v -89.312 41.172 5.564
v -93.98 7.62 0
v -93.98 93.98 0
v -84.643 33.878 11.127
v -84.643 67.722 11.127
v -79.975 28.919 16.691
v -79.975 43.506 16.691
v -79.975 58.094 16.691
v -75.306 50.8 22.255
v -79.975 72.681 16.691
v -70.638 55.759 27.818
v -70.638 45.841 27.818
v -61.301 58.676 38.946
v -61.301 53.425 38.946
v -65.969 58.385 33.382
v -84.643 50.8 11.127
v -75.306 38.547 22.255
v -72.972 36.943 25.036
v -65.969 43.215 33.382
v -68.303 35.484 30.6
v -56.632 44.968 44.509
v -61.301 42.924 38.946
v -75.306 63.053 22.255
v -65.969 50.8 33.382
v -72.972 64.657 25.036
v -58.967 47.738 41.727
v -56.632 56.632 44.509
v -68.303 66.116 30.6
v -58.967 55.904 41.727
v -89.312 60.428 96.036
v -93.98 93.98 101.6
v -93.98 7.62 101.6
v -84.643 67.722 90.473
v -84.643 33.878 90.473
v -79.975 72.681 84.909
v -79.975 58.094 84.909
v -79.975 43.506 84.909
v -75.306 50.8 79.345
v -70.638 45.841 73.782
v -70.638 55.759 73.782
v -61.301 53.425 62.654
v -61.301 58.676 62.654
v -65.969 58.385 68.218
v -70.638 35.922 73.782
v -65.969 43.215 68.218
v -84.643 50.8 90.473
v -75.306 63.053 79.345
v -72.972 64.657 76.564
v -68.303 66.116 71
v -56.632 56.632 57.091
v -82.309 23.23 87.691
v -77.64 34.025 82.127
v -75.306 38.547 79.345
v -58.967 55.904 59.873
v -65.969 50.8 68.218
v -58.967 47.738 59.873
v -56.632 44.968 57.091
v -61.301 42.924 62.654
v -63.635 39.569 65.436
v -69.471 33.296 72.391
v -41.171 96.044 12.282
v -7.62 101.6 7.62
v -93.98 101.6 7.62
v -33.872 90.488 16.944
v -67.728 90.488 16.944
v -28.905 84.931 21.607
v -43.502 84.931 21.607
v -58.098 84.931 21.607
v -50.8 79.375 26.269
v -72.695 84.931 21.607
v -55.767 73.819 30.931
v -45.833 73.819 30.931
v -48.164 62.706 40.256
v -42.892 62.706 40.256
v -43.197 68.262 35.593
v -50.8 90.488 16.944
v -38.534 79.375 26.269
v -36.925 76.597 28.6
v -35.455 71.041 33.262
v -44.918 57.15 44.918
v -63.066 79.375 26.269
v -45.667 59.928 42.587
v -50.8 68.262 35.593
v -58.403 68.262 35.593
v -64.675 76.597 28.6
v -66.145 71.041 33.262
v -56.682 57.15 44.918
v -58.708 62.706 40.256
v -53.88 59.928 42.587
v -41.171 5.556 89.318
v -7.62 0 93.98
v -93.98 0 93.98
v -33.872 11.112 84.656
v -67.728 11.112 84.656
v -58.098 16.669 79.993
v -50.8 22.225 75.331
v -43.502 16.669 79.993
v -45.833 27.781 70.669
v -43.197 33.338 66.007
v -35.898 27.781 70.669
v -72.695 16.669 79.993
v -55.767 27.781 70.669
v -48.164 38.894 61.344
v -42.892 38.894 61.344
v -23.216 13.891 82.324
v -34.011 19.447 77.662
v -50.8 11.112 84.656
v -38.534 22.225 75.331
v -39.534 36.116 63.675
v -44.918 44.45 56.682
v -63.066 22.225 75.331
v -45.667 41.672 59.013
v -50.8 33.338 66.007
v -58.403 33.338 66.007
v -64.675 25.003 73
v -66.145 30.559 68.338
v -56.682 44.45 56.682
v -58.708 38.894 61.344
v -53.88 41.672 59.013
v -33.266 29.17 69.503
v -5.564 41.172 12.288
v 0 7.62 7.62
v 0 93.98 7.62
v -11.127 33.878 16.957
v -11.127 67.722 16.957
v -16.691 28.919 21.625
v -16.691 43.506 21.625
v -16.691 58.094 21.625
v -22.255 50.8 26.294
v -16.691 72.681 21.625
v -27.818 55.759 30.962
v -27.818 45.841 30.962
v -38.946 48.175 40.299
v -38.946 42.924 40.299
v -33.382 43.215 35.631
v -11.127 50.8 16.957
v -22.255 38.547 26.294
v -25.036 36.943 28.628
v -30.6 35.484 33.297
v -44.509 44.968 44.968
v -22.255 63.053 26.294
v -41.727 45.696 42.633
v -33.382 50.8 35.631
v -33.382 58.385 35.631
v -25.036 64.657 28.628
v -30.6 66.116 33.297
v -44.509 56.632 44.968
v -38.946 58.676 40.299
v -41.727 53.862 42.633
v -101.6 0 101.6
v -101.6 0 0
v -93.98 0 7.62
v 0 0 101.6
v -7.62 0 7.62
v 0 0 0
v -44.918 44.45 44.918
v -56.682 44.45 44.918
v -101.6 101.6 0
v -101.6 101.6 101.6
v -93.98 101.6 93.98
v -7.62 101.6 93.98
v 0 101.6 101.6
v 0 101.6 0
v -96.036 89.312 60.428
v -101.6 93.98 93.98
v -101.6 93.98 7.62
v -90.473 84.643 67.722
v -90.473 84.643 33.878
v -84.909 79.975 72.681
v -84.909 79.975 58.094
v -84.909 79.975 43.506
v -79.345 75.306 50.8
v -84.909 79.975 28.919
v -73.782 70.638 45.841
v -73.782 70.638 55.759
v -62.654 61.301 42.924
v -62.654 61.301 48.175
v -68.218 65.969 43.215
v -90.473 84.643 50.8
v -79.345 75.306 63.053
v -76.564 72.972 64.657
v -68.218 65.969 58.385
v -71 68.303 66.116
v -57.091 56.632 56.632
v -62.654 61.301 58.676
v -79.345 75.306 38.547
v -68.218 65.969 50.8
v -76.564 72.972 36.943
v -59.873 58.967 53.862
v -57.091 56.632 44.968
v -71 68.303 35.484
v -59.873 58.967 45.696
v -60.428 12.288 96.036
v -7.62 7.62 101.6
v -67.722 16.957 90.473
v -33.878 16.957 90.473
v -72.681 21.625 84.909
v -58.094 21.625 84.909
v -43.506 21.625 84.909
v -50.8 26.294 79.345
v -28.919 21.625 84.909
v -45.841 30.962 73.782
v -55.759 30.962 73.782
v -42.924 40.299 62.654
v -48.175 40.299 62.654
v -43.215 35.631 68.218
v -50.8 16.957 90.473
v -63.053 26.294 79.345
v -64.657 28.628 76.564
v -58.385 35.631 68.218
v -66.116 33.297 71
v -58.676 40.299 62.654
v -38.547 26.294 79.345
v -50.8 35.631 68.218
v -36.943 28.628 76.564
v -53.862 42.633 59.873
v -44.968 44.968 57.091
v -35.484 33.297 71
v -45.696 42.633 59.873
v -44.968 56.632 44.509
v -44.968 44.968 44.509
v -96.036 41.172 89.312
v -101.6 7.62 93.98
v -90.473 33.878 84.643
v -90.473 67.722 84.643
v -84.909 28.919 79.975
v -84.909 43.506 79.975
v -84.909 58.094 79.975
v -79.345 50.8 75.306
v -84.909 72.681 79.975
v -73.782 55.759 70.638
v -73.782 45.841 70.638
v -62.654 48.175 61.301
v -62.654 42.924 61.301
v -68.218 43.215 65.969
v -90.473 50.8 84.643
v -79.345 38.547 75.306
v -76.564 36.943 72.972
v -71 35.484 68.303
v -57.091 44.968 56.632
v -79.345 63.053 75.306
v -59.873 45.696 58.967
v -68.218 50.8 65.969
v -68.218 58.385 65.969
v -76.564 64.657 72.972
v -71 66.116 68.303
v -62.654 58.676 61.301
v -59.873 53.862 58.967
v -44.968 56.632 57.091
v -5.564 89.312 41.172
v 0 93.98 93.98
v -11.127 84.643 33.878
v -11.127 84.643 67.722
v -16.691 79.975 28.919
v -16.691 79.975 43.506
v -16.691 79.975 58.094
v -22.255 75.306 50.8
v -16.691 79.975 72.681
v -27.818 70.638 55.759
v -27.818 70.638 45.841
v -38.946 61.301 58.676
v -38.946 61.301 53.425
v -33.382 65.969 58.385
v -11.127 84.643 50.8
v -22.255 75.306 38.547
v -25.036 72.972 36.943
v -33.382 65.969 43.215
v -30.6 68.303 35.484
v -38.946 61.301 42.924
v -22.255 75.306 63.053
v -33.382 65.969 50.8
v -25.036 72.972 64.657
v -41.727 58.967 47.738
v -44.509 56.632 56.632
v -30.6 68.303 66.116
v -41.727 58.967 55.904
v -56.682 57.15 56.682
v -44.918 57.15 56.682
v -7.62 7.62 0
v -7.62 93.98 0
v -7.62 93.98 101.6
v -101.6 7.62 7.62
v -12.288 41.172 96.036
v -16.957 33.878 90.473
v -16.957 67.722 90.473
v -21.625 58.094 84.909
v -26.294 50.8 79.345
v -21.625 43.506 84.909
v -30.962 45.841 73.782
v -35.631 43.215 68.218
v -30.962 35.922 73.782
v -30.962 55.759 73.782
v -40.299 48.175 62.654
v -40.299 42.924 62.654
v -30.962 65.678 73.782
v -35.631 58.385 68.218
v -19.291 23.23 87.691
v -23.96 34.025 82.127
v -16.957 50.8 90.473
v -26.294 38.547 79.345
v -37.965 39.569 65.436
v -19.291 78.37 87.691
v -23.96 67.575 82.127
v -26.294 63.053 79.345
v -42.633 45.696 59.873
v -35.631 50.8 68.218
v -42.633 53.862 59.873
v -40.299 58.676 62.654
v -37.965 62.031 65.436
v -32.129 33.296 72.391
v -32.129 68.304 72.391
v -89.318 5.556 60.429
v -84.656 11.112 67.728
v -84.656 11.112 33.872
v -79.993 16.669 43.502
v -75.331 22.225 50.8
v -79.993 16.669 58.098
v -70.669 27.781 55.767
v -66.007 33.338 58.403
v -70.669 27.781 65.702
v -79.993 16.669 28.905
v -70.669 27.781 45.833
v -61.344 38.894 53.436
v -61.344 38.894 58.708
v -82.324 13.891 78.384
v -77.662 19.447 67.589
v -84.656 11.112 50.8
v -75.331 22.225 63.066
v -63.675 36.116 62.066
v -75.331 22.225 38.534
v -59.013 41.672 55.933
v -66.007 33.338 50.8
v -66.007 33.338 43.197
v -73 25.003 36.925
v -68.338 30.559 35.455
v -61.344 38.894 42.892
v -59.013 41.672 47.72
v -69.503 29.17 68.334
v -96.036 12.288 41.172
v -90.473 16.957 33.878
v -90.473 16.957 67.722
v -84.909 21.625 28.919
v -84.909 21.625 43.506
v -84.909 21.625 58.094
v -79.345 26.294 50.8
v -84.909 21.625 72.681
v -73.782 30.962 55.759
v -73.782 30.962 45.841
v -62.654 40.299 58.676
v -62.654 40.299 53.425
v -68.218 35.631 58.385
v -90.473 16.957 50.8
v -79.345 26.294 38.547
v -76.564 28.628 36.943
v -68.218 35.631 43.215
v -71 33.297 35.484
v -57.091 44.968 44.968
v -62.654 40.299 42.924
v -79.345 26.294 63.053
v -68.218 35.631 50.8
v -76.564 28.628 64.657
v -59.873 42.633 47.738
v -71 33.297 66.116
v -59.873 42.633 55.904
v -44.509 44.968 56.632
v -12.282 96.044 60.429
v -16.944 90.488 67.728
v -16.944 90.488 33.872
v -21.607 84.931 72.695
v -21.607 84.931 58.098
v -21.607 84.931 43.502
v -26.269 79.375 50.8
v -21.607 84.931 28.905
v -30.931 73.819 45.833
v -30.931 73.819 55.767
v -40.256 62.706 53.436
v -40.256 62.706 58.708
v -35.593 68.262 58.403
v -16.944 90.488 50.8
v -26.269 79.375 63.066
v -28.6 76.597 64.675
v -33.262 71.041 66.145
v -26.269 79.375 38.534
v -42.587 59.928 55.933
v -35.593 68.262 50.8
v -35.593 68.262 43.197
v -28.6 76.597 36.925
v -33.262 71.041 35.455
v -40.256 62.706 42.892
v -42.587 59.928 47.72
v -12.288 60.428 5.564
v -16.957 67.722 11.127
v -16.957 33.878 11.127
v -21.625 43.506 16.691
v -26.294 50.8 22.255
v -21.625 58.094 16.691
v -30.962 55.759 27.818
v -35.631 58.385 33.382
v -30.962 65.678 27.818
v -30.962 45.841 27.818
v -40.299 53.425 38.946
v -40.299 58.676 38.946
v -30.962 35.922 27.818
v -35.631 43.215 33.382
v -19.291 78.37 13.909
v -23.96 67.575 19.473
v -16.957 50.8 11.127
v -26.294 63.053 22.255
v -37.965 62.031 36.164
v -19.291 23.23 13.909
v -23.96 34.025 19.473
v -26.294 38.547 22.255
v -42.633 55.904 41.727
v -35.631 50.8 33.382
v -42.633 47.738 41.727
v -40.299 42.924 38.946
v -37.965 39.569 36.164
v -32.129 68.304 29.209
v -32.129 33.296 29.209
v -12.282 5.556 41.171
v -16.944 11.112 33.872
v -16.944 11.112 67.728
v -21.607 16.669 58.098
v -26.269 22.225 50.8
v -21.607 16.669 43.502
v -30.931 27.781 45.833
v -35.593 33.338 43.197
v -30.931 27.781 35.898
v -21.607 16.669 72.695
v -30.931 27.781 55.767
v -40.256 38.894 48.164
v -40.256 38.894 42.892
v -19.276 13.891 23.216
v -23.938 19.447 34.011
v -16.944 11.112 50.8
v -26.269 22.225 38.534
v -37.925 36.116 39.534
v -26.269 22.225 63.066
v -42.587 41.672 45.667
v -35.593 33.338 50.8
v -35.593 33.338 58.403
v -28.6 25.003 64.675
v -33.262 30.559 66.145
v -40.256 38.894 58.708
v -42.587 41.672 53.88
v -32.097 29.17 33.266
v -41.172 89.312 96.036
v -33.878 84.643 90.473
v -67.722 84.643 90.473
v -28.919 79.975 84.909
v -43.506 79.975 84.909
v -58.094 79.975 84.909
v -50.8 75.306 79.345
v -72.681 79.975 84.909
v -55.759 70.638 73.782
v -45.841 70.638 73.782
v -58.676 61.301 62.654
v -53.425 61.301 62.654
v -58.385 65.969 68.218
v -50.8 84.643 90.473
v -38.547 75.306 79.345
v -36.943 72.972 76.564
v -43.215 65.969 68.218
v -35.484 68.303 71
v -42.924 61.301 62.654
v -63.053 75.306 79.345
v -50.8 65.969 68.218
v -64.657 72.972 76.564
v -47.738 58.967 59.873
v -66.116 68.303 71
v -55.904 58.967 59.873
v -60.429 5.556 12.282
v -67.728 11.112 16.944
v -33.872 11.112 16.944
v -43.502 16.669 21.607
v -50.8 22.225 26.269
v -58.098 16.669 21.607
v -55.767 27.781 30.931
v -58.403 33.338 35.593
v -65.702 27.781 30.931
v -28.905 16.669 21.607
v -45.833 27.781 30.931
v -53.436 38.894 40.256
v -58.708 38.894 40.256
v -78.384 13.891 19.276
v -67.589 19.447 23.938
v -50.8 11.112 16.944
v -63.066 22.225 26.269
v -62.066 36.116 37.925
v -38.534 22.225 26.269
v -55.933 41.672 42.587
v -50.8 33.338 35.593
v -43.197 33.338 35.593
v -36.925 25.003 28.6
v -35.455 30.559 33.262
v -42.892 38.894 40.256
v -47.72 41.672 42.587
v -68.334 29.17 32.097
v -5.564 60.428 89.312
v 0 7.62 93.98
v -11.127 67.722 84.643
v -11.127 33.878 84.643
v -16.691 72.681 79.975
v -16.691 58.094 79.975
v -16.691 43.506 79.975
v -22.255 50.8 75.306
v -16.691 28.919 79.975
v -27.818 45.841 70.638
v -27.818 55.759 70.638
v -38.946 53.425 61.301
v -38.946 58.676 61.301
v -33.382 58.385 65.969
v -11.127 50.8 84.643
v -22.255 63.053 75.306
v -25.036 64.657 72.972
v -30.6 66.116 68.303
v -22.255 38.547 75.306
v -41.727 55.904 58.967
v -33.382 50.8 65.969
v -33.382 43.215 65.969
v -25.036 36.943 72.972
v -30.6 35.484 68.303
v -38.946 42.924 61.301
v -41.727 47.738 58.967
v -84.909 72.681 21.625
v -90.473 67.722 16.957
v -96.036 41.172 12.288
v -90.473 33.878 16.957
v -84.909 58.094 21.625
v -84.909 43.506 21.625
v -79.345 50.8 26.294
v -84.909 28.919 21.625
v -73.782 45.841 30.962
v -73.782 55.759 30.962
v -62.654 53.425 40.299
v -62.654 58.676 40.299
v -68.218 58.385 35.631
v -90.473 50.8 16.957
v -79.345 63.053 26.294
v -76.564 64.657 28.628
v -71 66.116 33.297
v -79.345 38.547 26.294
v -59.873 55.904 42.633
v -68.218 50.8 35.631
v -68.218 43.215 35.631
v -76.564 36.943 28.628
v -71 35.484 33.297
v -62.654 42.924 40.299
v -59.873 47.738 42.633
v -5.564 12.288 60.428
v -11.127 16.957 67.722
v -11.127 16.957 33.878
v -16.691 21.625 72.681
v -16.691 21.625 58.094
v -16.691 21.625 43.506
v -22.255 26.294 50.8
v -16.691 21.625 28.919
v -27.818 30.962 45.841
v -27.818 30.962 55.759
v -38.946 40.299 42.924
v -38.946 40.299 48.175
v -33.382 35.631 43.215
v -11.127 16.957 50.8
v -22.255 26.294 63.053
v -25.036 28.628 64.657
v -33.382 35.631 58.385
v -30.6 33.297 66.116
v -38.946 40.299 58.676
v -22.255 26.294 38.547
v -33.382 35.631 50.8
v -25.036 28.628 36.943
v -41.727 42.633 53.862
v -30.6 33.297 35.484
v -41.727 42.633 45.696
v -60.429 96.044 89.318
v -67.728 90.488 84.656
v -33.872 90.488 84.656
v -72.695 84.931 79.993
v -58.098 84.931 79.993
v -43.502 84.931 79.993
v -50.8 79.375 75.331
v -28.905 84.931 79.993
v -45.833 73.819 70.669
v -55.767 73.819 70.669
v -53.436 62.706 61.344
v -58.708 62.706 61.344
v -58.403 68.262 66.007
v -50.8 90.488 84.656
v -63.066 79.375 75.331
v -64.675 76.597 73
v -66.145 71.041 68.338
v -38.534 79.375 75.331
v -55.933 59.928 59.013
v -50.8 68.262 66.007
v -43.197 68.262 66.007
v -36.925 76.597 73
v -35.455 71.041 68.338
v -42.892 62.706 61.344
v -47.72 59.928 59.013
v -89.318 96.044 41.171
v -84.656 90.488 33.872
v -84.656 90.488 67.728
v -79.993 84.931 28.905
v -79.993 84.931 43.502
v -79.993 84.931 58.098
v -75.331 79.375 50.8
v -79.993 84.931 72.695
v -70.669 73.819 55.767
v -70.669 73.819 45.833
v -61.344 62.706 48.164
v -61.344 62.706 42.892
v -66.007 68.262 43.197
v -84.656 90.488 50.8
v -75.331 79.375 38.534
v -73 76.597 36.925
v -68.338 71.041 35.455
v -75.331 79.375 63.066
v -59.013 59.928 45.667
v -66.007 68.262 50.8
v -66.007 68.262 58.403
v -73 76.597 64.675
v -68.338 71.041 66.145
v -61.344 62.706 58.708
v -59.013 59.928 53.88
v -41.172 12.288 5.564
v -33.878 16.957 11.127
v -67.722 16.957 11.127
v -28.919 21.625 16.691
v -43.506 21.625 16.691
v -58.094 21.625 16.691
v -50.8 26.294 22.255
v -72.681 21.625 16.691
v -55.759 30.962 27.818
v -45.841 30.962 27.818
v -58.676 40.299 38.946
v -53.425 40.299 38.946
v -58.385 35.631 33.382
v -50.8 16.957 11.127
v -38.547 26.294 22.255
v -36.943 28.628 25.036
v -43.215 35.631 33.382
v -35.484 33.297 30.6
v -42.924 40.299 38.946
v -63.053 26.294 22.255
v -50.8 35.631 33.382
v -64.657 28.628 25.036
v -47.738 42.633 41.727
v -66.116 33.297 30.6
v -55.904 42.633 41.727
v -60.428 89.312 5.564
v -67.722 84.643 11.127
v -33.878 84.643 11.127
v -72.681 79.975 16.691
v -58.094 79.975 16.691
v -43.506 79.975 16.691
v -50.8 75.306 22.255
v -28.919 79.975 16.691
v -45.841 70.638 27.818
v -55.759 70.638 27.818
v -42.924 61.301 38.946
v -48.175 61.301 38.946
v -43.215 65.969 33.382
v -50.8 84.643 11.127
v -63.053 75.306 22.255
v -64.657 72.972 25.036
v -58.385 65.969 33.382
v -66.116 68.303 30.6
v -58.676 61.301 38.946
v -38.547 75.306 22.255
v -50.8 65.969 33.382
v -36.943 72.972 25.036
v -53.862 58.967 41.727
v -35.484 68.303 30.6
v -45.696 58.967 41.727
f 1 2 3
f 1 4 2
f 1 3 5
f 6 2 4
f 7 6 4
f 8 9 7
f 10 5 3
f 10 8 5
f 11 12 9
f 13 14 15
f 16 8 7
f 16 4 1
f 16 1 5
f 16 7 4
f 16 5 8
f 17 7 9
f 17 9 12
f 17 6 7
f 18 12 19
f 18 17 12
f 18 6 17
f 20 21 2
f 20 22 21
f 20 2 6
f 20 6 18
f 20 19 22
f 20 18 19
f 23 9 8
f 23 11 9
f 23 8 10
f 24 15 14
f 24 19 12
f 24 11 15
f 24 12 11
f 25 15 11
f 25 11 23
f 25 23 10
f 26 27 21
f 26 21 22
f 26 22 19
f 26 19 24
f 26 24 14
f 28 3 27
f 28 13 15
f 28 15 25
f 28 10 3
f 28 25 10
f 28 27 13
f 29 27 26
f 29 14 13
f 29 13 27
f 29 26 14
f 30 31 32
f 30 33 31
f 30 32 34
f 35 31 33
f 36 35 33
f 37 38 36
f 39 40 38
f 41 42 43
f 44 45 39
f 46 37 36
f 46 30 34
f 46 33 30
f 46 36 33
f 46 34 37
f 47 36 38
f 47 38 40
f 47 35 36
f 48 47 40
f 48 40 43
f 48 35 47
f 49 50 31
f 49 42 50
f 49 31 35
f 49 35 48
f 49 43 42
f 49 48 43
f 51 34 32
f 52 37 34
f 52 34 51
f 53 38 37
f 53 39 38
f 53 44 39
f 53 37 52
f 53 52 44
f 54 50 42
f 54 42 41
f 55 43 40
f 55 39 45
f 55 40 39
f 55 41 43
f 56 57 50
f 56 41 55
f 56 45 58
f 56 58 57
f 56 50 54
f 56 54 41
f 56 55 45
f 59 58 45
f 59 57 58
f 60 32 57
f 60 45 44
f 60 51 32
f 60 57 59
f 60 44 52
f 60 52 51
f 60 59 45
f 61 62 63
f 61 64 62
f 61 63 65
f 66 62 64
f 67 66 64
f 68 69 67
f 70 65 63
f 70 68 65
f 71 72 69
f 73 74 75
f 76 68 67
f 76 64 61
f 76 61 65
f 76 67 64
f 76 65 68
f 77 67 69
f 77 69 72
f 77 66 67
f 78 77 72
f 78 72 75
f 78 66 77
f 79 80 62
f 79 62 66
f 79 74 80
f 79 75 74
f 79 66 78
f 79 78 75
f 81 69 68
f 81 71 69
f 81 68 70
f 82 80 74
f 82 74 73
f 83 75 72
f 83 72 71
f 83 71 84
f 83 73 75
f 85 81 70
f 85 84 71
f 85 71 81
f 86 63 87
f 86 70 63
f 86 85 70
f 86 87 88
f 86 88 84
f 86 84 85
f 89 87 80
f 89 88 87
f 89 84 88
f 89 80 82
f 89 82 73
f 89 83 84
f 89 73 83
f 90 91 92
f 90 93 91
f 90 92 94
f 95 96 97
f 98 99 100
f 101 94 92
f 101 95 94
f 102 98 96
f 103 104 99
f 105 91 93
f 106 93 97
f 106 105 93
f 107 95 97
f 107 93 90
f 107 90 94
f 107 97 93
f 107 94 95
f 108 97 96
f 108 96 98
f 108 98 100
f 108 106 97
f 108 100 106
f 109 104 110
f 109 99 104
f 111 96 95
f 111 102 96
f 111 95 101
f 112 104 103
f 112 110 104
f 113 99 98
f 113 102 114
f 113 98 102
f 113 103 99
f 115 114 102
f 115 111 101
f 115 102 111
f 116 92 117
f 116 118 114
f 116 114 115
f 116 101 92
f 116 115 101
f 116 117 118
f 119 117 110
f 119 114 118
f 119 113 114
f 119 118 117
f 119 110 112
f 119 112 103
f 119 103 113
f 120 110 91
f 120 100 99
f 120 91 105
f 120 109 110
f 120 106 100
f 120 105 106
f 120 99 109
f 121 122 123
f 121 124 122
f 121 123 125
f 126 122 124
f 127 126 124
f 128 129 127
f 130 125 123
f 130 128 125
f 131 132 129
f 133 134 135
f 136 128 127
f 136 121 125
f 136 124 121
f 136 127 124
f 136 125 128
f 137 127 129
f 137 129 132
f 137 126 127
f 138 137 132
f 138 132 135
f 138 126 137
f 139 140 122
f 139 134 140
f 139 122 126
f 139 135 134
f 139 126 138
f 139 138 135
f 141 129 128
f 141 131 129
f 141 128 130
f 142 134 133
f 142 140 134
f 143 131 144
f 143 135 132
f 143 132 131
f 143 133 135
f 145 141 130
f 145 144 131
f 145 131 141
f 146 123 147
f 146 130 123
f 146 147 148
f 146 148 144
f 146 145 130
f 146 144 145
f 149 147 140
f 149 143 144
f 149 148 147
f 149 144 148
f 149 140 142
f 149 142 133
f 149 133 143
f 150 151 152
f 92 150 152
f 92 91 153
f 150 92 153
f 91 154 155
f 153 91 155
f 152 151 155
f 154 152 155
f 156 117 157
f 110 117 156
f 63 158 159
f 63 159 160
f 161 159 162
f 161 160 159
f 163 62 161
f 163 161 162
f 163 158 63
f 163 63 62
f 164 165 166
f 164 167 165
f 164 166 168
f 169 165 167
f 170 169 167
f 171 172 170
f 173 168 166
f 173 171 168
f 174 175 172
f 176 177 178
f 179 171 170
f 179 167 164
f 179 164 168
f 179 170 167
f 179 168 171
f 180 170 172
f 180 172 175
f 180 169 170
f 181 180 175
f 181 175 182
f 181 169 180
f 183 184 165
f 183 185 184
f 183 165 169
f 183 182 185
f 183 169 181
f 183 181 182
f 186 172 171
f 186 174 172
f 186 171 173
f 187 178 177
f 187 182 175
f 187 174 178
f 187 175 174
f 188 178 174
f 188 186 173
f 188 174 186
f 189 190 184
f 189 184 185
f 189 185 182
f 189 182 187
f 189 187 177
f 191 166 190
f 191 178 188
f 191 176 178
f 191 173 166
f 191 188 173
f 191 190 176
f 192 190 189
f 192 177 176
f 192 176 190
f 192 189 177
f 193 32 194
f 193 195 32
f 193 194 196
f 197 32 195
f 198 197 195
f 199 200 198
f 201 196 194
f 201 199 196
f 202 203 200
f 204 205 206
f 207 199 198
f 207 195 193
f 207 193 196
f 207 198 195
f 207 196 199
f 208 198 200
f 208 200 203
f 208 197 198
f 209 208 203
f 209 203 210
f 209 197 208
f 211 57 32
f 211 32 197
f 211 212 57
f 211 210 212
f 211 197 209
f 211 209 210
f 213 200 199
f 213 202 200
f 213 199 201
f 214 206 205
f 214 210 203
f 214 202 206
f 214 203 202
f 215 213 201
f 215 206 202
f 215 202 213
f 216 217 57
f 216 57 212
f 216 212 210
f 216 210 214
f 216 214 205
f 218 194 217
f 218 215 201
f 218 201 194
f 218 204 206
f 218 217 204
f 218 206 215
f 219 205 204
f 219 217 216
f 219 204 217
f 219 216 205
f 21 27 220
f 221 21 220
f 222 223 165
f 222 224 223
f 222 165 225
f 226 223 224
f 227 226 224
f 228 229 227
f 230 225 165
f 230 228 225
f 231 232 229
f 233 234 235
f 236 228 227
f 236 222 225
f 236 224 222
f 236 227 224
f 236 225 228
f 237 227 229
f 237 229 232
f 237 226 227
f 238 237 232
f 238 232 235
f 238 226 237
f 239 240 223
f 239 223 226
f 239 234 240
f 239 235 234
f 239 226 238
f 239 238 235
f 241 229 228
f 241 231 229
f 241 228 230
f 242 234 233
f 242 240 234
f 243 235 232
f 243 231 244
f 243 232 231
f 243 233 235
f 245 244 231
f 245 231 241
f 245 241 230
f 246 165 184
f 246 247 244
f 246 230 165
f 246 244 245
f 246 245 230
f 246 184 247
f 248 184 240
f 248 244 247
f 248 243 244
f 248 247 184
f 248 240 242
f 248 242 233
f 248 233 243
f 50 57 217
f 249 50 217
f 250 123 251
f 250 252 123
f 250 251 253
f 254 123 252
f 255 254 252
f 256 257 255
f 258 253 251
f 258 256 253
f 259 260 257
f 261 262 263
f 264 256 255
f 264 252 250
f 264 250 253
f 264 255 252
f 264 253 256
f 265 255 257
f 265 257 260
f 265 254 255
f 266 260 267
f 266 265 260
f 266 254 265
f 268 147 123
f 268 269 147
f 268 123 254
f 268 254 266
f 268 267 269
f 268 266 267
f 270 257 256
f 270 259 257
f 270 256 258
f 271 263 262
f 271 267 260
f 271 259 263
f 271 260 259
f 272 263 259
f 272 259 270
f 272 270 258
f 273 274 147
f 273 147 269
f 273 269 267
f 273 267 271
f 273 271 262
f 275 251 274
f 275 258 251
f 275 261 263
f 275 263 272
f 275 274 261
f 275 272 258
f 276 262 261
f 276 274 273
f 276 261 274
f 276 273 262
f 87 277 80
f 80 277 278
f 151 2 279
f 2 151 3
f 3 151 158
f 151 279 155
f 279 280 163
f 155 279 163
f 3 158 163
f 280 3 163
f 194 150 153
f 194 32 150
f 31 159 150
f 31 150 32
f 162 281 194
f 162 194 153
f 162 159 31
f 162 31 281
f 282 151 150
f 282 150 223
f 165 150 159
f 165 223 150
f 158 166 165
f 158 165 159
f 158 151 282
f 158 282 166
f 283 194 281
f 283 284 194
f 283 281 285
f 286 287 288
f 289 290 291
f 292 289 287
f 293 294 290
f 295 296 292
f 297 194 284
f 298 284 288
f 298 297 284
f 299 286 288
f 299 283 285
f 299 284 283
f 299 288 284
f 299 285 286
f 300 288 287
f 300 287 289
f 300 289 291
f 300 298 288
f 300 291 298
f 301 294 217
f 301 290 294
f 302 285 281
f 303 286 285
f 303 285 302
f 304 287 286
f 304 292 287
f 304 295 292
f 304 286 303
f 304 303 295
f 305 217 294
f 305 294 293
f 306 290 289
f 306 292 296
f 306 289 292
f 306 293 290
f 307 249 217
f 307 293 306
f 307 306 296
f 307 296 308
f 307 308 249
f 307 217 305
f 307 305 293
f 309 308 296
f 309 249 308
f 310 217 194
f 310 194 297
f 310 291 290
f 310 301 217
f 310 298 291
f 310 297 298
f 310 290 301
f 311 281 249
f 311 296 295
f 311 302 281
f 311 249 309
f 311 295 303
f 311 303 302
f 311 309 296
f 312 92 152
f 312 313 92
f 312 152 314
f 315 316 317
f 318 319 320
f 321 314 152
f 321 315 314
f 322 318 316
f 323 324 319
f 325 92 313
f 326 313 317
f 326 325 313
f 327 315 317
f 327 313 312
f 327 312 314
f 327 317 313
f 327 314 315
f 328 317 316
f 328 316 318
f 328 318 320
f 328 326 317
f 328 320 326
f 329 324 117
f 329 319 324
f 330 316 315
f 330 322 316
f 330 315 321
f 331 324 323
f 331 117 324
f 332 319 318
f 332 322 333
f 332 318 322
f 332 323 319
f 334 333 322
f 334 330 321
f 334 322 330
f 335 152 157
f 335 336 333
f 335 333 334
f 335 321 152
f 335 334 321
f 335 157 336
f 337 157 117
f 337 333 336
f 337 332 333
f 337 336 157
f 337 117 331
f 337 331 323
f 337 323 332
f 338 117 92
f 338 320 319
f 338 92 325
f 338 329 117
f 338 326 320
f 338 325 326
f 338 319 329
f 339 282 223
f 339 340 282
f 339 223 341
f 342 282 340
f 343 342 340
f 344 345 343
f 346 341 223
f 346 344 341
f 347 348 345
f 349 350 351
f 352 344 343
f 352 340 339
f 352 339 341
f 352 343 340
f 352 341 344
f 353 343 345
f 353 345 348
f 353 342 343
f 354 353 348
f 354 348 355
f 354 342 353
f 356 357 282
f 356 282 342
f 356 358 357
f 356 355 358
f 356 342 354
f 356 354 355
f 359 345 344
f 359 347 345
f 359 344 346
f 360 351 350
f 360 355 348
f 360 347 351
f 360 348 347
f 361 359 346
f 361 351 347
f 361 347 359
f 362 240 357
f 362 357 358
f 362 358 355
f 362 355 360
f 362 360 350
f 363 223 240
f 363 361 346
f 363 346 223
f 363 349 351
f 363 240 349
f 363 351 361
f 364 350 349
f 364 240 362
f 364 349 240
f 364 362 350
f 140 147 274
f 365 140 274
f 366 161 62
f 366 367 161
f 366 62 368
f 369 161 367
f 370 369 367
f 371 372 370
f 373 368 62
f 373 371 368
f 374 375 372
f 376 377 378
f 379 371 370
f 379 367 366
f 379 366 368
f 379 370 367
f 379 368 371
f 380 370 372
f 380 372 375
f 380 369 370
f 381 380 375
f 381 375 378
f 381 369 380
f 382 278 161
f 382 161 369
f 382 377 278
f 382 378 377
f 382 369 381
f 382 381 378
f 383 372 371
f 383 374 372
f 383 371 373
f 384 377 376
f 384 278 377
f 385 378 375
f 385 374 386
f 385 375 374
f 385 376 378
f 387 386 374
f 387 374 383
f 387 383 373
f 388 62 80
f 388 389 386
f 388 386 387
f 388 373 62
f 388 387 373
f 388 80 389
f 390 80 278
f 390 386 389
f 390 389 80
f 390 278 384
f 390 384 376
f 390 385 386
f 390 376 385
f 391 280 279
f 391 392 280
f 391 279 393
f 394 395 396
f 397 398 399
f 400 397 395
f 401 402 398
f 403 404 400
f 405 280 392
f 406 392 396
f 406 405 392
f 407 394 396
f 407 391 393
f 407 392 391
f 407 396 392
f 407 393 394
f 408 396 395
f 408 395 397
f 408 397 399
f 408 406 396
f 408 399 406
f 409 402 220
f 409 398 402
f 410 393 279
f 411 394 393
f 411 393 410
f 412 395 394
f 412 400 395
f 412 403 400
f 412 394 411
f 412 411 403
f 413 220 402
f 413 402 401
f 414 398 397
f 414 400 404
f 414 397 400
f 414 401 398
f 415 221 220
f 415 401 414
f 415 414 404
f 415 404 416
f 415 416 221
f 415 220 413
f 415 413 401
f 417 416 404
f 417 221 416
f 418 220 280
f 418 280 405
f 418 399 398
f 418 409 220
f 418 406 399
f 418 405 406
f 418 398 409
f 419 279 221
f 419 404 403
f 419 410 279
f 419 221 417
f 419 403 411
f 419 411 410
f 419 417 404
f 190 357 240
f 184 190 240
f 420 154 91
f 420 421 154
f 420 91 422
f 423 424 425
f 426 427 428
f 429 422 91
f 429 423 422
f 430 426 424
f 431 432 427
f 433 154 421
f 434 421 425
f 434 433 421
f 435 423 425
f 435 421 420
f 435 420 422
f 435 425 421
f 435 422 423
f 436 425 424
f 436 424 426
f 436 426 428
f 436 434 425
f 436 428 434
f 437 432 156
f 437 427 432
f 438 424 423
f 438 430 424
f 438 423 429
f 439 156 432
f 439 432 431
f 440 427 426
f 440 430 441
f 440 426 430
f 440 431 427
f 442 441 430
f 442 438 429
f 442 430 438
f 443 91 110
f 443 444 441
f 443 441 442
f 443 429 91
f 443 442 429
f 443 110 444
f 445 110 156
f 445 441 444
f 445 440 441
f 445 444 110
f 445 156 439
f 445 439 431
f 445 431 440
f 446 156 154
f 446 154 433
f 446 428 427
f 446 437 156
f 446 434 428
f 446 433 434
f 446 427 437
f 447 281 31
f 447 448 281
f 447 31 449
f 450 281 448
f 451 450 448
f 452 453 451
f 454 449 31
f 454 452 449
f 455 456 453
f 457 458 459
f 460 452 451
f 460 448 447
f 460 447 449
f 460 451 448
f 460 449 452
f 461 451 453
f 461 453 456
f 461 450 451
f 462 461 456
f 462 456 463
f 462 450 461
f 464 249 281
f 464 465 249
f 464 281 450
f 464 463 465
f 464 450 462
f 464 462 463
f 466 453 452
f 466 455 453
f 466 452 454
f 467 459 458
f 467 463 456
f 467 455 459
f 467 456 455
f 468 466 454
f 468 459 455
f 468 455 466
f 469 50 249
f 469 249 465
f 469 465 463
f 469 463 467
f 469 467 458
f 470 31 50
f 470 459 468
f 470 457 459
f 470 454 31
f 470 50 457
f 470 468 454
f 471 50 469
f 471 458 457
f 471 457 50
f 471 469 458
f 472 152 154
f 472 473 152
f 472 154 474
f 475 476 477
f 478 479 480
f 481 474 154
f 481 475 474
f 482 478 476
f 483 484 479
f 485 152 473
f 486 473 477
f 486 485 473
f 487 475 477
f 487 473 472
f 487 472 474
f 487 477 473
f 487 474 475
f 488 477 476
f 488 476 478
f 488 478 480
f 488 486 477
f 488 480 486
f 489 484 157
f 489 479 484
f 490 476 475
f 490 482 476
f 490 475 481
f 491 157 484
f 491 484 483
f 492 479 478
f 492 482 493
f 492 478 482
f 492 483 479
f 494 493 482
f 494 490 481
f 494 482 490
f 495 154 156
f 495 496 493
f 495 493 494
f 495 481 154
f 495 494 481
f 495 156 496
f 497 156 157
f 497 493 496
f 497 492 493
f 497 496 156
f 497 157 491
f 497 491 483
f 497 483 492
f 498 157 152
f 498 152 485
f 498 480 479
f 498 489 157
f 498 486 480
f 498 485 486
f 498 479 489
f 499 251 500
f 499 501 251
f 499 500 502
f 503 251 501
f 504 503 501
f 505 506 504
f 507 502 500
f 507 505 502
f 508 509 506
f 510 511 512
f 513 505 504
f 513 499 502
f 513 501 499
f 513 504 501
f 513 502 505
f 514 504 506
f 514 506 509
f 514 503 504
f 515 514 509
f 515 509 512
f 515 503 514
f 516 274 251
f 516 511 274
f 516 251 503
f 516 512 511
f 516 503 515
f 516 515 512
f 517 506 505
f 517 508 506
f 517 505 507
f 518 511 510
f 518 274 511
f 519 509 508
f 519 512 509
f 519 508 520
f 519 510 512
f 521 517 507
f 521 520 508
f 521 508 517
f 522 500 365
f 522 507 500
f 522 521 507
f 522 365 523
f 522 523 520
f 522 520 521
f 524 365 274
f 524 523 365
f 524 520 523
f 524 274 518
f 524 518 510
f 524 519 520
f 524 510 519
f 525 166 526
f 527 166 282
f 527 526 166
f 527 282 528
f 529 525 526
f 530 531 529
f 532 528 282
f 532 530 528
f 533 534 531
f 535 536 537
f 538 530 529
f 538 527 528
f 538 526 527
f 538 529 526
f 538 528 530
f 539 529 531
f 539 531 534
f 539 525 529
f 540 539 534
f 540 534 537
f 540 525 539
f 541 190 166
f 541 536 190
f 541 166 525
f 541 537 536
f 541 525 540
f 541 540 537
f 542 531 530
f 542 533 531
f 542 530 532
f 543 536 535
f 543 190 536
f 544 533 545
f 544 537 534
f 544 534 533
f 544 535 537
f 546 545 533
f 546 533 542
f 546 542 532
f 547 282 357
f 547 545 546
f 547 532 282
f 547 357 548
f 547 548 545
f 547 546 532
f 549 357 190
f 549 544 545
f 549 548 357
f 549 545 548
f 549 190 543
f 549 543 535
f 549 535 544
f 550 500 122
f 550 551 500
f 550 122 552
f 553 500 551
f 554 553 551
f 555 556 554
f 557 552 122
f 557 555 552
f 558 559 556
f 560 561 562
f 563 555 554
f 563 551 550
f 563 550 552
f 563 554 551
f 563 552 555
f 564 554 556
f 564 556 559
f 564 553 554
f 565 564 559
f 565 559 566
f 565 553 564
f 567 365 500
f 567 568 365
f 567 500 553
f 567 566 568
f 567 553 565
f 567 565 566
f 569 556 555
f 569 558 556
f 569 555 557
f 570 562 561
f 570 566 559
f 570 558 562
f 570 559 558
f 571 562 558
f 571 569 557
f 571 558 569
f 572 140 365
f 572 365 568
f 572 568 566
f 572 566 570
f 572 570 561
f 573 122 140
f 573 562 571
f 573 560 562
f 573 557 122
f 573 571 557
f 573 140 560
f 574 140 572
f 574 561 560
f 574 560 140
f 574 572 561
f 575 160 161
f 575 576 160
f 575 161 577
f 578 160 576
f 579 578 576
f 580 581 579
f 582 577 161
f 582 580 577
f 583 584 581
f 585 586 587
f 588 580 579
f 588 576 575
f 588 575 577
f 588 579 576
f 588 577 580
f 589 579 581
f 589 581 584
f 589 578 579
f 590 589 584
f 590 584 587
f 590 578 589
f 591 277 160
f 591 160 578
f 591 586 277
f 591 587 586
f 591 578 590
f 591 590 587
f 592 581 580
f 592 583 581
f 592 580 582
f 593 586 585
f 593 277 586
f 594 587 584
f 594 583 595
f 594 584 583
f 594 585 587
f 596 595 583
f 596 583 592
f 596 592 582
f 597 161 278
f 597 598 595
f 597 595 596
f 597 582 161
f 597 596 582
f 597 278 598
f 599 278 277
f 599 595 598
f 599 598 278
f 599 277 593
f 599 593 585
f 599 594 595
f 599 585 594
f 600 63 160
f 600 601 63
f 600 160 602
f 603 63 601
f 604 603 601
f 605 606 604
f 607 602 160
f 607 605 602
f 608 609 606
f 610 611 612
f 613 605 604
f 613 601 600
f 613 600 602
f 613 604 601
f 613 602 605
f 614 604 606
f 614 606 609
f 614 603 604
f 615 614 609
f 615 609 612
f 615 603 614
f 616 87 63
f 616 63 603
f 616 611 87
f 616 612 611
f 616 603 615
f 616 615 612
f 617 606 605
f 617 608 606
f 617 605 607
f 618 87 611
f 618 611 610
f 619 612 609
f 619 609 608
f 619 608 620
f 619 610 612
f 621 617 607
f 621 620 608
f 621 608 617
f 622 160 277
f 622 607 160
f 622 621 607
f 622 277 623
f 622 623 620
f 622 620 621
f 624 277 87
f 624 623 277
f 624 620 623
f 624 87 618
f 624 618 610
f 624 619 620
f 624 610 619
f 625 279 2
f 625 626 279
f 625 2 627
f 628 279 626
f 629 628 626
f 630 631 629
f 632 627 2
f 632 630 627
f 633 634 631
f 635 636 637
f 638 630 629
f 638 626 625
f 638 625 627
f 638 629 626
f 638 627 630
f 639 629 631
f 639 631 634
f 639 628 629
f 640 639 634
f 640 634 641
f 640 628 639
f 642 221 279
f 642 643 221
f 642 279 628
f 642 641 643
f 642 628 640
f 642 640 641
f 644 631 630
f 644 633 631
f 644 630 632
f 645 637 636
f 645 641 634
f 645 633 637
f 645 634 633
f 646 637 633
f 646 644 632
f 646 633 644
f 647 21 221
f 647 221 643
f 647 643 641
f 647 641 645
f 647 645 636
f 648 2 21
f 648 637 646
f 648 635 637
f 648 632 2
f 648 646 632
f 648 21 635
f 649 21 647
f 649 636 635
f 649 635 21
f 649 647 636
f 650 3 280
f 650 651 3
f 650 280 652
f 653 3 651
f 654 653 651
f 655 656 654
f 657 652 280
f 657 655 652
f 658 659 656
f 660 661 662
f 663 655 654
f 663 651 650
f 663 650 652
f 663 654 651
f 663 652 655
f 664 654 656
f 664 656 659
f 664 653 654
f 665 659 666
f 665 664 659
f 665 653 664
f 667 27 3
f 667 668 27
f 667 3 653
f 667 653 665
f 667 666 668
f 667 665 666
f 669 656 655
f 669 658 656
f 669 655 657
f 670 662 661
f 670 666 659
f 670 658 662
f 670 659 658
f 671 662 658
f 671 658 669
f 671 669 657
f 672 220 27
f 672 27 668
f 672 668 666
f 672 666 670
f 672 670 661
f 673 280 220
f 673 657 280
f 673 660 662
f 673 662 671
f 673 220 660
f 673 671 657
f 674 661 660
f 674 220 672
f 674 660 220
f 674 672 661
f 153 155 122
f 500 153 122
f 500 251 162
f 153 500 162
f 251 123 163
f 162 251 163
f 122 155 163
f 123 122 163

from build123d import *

# Parameters (mm, degrees)
F0_W           = 101.6
F0_H           = 101.6
F1_DEPTH       = 101.6
F2_W           = 86.36
F2_H           = 86.36
F3_DEPTH       = 46.99
F3_TAPER       = 40
F4_W           = 86.36
F4_H           = 86.36
F5_DEPTH       = 46.99
F5_TAPER       = 40
F6_W           = 86.36
F6_H           = 86.36
F7_DEPTH       = 46.99
F7_TAPER       = 40
F8_W           = 86.36
F8_H           = 86.36
F9_DEPTH       = 46.99
F9_TAPER       = 40
F10_W          = 86.36
F10_H          = 86.36
F11_DEPTH      = 46.99
F11_TAPER      = 40
F12_W          = 86.36
F12_H          = 86.36
F13_DEPTH      = 46.99
F13_TAPER      = 40
F14_W          = 12.581416662
F14_H          = 12.581416662
F15_DEPTH      = 2.54
F15_DEPTH_BACK = 10.16


with BuildPart() as f1:
    # F0 (on Top) → F1 (new body)
    with BuildSketch(Plane.XY):
        with Locations((-50.8, 50.8)):
            Rectangle(F0_W, F0_H)
    extrude(amount=F1_DEPTH)

    # F2 (on face) → F3 (cut)
    with BuildSketch(Plane.XZ):
        with Locations((-50.8, 50.8)):
            Rectangle(F2_W, F2_H)
    extrude(amount=-F3_DEPTH, taper=F3_TAPER, mode=Mode.SUBTRACT)

    # F4 (on face) → F5 (cut)
    with BuildSketch(Plane.YZ):
        with Locations((50.8, 50.8)):
            Rectangle(F4_W, F4_H)
    extrude(amount=-F5_DEPTH, taper=F5_TAPER, mode=Mode.SUBTRACT)

    # F6 (on face) → F7 (cut)
    with BuildSketch(Plane.XY.offset(101.6)):
        with Locations((-50.8, 50.8)):
            Rectangle(F6_W, F6_H)
    extrude(amount=-F7_DEPTH, taper=F7_TAPER, mode=Mode.SUBTRACT)

    # F8 (on face) → F9 (cut)
    with BuildSketch(Plane(origin=(-101.6, 0, 0), x_dir=(0, -1, 0), z_dir=(-1, 0, 0))):
        with Locations((-50.8, 50.8)):
            Rectangle(F8_W, F8_H)
    extrude(amount=-F9_DEPTH, taper=F9_TAPER, mode=Mode.SUBTRACT)

    # F10 (on face) → F11 (cut)
    with BuildSketch(Plane(origin=(0, 101.6, 0), x_dir=(-1, 0, 0), z_dir=(0, 1, 0))):
        with Locations((50.8, 50.8)):
            Rectangle(F10_W, F10_H)
    extrude(amount=-F11_DEPTH, taper=F11_TAPER, mode=Mode.SUBTRACT)

    # F12 (on face) → F13 (cut)
    with BuildSketch(Plane(origin=(0, 0, 0), x_dir=(1, 0, 0), z_dir=(0, 0, -1))):
        with Locations((-50.8, -50.8)):
            Rectangle(F12_W, F12_H)
    extrude(amount=-F13_DEPTH, taper=F13_TAPER, mode=Mode.SUBTRACT)

    # F14 (on face) → F15 (join, two sides)
    with BuildSketch(Plane.XZ.offset(-46.99)) as f15_sk:
        with Locations((-50.8, 50.8)):
            Rectangle(F14_W, F14_H)
    extrude(amount=F15_DEPTH)
    extrude(f15_sk.sketch, amount=-F15_DEPTH_BACK)


solid = f1.part
